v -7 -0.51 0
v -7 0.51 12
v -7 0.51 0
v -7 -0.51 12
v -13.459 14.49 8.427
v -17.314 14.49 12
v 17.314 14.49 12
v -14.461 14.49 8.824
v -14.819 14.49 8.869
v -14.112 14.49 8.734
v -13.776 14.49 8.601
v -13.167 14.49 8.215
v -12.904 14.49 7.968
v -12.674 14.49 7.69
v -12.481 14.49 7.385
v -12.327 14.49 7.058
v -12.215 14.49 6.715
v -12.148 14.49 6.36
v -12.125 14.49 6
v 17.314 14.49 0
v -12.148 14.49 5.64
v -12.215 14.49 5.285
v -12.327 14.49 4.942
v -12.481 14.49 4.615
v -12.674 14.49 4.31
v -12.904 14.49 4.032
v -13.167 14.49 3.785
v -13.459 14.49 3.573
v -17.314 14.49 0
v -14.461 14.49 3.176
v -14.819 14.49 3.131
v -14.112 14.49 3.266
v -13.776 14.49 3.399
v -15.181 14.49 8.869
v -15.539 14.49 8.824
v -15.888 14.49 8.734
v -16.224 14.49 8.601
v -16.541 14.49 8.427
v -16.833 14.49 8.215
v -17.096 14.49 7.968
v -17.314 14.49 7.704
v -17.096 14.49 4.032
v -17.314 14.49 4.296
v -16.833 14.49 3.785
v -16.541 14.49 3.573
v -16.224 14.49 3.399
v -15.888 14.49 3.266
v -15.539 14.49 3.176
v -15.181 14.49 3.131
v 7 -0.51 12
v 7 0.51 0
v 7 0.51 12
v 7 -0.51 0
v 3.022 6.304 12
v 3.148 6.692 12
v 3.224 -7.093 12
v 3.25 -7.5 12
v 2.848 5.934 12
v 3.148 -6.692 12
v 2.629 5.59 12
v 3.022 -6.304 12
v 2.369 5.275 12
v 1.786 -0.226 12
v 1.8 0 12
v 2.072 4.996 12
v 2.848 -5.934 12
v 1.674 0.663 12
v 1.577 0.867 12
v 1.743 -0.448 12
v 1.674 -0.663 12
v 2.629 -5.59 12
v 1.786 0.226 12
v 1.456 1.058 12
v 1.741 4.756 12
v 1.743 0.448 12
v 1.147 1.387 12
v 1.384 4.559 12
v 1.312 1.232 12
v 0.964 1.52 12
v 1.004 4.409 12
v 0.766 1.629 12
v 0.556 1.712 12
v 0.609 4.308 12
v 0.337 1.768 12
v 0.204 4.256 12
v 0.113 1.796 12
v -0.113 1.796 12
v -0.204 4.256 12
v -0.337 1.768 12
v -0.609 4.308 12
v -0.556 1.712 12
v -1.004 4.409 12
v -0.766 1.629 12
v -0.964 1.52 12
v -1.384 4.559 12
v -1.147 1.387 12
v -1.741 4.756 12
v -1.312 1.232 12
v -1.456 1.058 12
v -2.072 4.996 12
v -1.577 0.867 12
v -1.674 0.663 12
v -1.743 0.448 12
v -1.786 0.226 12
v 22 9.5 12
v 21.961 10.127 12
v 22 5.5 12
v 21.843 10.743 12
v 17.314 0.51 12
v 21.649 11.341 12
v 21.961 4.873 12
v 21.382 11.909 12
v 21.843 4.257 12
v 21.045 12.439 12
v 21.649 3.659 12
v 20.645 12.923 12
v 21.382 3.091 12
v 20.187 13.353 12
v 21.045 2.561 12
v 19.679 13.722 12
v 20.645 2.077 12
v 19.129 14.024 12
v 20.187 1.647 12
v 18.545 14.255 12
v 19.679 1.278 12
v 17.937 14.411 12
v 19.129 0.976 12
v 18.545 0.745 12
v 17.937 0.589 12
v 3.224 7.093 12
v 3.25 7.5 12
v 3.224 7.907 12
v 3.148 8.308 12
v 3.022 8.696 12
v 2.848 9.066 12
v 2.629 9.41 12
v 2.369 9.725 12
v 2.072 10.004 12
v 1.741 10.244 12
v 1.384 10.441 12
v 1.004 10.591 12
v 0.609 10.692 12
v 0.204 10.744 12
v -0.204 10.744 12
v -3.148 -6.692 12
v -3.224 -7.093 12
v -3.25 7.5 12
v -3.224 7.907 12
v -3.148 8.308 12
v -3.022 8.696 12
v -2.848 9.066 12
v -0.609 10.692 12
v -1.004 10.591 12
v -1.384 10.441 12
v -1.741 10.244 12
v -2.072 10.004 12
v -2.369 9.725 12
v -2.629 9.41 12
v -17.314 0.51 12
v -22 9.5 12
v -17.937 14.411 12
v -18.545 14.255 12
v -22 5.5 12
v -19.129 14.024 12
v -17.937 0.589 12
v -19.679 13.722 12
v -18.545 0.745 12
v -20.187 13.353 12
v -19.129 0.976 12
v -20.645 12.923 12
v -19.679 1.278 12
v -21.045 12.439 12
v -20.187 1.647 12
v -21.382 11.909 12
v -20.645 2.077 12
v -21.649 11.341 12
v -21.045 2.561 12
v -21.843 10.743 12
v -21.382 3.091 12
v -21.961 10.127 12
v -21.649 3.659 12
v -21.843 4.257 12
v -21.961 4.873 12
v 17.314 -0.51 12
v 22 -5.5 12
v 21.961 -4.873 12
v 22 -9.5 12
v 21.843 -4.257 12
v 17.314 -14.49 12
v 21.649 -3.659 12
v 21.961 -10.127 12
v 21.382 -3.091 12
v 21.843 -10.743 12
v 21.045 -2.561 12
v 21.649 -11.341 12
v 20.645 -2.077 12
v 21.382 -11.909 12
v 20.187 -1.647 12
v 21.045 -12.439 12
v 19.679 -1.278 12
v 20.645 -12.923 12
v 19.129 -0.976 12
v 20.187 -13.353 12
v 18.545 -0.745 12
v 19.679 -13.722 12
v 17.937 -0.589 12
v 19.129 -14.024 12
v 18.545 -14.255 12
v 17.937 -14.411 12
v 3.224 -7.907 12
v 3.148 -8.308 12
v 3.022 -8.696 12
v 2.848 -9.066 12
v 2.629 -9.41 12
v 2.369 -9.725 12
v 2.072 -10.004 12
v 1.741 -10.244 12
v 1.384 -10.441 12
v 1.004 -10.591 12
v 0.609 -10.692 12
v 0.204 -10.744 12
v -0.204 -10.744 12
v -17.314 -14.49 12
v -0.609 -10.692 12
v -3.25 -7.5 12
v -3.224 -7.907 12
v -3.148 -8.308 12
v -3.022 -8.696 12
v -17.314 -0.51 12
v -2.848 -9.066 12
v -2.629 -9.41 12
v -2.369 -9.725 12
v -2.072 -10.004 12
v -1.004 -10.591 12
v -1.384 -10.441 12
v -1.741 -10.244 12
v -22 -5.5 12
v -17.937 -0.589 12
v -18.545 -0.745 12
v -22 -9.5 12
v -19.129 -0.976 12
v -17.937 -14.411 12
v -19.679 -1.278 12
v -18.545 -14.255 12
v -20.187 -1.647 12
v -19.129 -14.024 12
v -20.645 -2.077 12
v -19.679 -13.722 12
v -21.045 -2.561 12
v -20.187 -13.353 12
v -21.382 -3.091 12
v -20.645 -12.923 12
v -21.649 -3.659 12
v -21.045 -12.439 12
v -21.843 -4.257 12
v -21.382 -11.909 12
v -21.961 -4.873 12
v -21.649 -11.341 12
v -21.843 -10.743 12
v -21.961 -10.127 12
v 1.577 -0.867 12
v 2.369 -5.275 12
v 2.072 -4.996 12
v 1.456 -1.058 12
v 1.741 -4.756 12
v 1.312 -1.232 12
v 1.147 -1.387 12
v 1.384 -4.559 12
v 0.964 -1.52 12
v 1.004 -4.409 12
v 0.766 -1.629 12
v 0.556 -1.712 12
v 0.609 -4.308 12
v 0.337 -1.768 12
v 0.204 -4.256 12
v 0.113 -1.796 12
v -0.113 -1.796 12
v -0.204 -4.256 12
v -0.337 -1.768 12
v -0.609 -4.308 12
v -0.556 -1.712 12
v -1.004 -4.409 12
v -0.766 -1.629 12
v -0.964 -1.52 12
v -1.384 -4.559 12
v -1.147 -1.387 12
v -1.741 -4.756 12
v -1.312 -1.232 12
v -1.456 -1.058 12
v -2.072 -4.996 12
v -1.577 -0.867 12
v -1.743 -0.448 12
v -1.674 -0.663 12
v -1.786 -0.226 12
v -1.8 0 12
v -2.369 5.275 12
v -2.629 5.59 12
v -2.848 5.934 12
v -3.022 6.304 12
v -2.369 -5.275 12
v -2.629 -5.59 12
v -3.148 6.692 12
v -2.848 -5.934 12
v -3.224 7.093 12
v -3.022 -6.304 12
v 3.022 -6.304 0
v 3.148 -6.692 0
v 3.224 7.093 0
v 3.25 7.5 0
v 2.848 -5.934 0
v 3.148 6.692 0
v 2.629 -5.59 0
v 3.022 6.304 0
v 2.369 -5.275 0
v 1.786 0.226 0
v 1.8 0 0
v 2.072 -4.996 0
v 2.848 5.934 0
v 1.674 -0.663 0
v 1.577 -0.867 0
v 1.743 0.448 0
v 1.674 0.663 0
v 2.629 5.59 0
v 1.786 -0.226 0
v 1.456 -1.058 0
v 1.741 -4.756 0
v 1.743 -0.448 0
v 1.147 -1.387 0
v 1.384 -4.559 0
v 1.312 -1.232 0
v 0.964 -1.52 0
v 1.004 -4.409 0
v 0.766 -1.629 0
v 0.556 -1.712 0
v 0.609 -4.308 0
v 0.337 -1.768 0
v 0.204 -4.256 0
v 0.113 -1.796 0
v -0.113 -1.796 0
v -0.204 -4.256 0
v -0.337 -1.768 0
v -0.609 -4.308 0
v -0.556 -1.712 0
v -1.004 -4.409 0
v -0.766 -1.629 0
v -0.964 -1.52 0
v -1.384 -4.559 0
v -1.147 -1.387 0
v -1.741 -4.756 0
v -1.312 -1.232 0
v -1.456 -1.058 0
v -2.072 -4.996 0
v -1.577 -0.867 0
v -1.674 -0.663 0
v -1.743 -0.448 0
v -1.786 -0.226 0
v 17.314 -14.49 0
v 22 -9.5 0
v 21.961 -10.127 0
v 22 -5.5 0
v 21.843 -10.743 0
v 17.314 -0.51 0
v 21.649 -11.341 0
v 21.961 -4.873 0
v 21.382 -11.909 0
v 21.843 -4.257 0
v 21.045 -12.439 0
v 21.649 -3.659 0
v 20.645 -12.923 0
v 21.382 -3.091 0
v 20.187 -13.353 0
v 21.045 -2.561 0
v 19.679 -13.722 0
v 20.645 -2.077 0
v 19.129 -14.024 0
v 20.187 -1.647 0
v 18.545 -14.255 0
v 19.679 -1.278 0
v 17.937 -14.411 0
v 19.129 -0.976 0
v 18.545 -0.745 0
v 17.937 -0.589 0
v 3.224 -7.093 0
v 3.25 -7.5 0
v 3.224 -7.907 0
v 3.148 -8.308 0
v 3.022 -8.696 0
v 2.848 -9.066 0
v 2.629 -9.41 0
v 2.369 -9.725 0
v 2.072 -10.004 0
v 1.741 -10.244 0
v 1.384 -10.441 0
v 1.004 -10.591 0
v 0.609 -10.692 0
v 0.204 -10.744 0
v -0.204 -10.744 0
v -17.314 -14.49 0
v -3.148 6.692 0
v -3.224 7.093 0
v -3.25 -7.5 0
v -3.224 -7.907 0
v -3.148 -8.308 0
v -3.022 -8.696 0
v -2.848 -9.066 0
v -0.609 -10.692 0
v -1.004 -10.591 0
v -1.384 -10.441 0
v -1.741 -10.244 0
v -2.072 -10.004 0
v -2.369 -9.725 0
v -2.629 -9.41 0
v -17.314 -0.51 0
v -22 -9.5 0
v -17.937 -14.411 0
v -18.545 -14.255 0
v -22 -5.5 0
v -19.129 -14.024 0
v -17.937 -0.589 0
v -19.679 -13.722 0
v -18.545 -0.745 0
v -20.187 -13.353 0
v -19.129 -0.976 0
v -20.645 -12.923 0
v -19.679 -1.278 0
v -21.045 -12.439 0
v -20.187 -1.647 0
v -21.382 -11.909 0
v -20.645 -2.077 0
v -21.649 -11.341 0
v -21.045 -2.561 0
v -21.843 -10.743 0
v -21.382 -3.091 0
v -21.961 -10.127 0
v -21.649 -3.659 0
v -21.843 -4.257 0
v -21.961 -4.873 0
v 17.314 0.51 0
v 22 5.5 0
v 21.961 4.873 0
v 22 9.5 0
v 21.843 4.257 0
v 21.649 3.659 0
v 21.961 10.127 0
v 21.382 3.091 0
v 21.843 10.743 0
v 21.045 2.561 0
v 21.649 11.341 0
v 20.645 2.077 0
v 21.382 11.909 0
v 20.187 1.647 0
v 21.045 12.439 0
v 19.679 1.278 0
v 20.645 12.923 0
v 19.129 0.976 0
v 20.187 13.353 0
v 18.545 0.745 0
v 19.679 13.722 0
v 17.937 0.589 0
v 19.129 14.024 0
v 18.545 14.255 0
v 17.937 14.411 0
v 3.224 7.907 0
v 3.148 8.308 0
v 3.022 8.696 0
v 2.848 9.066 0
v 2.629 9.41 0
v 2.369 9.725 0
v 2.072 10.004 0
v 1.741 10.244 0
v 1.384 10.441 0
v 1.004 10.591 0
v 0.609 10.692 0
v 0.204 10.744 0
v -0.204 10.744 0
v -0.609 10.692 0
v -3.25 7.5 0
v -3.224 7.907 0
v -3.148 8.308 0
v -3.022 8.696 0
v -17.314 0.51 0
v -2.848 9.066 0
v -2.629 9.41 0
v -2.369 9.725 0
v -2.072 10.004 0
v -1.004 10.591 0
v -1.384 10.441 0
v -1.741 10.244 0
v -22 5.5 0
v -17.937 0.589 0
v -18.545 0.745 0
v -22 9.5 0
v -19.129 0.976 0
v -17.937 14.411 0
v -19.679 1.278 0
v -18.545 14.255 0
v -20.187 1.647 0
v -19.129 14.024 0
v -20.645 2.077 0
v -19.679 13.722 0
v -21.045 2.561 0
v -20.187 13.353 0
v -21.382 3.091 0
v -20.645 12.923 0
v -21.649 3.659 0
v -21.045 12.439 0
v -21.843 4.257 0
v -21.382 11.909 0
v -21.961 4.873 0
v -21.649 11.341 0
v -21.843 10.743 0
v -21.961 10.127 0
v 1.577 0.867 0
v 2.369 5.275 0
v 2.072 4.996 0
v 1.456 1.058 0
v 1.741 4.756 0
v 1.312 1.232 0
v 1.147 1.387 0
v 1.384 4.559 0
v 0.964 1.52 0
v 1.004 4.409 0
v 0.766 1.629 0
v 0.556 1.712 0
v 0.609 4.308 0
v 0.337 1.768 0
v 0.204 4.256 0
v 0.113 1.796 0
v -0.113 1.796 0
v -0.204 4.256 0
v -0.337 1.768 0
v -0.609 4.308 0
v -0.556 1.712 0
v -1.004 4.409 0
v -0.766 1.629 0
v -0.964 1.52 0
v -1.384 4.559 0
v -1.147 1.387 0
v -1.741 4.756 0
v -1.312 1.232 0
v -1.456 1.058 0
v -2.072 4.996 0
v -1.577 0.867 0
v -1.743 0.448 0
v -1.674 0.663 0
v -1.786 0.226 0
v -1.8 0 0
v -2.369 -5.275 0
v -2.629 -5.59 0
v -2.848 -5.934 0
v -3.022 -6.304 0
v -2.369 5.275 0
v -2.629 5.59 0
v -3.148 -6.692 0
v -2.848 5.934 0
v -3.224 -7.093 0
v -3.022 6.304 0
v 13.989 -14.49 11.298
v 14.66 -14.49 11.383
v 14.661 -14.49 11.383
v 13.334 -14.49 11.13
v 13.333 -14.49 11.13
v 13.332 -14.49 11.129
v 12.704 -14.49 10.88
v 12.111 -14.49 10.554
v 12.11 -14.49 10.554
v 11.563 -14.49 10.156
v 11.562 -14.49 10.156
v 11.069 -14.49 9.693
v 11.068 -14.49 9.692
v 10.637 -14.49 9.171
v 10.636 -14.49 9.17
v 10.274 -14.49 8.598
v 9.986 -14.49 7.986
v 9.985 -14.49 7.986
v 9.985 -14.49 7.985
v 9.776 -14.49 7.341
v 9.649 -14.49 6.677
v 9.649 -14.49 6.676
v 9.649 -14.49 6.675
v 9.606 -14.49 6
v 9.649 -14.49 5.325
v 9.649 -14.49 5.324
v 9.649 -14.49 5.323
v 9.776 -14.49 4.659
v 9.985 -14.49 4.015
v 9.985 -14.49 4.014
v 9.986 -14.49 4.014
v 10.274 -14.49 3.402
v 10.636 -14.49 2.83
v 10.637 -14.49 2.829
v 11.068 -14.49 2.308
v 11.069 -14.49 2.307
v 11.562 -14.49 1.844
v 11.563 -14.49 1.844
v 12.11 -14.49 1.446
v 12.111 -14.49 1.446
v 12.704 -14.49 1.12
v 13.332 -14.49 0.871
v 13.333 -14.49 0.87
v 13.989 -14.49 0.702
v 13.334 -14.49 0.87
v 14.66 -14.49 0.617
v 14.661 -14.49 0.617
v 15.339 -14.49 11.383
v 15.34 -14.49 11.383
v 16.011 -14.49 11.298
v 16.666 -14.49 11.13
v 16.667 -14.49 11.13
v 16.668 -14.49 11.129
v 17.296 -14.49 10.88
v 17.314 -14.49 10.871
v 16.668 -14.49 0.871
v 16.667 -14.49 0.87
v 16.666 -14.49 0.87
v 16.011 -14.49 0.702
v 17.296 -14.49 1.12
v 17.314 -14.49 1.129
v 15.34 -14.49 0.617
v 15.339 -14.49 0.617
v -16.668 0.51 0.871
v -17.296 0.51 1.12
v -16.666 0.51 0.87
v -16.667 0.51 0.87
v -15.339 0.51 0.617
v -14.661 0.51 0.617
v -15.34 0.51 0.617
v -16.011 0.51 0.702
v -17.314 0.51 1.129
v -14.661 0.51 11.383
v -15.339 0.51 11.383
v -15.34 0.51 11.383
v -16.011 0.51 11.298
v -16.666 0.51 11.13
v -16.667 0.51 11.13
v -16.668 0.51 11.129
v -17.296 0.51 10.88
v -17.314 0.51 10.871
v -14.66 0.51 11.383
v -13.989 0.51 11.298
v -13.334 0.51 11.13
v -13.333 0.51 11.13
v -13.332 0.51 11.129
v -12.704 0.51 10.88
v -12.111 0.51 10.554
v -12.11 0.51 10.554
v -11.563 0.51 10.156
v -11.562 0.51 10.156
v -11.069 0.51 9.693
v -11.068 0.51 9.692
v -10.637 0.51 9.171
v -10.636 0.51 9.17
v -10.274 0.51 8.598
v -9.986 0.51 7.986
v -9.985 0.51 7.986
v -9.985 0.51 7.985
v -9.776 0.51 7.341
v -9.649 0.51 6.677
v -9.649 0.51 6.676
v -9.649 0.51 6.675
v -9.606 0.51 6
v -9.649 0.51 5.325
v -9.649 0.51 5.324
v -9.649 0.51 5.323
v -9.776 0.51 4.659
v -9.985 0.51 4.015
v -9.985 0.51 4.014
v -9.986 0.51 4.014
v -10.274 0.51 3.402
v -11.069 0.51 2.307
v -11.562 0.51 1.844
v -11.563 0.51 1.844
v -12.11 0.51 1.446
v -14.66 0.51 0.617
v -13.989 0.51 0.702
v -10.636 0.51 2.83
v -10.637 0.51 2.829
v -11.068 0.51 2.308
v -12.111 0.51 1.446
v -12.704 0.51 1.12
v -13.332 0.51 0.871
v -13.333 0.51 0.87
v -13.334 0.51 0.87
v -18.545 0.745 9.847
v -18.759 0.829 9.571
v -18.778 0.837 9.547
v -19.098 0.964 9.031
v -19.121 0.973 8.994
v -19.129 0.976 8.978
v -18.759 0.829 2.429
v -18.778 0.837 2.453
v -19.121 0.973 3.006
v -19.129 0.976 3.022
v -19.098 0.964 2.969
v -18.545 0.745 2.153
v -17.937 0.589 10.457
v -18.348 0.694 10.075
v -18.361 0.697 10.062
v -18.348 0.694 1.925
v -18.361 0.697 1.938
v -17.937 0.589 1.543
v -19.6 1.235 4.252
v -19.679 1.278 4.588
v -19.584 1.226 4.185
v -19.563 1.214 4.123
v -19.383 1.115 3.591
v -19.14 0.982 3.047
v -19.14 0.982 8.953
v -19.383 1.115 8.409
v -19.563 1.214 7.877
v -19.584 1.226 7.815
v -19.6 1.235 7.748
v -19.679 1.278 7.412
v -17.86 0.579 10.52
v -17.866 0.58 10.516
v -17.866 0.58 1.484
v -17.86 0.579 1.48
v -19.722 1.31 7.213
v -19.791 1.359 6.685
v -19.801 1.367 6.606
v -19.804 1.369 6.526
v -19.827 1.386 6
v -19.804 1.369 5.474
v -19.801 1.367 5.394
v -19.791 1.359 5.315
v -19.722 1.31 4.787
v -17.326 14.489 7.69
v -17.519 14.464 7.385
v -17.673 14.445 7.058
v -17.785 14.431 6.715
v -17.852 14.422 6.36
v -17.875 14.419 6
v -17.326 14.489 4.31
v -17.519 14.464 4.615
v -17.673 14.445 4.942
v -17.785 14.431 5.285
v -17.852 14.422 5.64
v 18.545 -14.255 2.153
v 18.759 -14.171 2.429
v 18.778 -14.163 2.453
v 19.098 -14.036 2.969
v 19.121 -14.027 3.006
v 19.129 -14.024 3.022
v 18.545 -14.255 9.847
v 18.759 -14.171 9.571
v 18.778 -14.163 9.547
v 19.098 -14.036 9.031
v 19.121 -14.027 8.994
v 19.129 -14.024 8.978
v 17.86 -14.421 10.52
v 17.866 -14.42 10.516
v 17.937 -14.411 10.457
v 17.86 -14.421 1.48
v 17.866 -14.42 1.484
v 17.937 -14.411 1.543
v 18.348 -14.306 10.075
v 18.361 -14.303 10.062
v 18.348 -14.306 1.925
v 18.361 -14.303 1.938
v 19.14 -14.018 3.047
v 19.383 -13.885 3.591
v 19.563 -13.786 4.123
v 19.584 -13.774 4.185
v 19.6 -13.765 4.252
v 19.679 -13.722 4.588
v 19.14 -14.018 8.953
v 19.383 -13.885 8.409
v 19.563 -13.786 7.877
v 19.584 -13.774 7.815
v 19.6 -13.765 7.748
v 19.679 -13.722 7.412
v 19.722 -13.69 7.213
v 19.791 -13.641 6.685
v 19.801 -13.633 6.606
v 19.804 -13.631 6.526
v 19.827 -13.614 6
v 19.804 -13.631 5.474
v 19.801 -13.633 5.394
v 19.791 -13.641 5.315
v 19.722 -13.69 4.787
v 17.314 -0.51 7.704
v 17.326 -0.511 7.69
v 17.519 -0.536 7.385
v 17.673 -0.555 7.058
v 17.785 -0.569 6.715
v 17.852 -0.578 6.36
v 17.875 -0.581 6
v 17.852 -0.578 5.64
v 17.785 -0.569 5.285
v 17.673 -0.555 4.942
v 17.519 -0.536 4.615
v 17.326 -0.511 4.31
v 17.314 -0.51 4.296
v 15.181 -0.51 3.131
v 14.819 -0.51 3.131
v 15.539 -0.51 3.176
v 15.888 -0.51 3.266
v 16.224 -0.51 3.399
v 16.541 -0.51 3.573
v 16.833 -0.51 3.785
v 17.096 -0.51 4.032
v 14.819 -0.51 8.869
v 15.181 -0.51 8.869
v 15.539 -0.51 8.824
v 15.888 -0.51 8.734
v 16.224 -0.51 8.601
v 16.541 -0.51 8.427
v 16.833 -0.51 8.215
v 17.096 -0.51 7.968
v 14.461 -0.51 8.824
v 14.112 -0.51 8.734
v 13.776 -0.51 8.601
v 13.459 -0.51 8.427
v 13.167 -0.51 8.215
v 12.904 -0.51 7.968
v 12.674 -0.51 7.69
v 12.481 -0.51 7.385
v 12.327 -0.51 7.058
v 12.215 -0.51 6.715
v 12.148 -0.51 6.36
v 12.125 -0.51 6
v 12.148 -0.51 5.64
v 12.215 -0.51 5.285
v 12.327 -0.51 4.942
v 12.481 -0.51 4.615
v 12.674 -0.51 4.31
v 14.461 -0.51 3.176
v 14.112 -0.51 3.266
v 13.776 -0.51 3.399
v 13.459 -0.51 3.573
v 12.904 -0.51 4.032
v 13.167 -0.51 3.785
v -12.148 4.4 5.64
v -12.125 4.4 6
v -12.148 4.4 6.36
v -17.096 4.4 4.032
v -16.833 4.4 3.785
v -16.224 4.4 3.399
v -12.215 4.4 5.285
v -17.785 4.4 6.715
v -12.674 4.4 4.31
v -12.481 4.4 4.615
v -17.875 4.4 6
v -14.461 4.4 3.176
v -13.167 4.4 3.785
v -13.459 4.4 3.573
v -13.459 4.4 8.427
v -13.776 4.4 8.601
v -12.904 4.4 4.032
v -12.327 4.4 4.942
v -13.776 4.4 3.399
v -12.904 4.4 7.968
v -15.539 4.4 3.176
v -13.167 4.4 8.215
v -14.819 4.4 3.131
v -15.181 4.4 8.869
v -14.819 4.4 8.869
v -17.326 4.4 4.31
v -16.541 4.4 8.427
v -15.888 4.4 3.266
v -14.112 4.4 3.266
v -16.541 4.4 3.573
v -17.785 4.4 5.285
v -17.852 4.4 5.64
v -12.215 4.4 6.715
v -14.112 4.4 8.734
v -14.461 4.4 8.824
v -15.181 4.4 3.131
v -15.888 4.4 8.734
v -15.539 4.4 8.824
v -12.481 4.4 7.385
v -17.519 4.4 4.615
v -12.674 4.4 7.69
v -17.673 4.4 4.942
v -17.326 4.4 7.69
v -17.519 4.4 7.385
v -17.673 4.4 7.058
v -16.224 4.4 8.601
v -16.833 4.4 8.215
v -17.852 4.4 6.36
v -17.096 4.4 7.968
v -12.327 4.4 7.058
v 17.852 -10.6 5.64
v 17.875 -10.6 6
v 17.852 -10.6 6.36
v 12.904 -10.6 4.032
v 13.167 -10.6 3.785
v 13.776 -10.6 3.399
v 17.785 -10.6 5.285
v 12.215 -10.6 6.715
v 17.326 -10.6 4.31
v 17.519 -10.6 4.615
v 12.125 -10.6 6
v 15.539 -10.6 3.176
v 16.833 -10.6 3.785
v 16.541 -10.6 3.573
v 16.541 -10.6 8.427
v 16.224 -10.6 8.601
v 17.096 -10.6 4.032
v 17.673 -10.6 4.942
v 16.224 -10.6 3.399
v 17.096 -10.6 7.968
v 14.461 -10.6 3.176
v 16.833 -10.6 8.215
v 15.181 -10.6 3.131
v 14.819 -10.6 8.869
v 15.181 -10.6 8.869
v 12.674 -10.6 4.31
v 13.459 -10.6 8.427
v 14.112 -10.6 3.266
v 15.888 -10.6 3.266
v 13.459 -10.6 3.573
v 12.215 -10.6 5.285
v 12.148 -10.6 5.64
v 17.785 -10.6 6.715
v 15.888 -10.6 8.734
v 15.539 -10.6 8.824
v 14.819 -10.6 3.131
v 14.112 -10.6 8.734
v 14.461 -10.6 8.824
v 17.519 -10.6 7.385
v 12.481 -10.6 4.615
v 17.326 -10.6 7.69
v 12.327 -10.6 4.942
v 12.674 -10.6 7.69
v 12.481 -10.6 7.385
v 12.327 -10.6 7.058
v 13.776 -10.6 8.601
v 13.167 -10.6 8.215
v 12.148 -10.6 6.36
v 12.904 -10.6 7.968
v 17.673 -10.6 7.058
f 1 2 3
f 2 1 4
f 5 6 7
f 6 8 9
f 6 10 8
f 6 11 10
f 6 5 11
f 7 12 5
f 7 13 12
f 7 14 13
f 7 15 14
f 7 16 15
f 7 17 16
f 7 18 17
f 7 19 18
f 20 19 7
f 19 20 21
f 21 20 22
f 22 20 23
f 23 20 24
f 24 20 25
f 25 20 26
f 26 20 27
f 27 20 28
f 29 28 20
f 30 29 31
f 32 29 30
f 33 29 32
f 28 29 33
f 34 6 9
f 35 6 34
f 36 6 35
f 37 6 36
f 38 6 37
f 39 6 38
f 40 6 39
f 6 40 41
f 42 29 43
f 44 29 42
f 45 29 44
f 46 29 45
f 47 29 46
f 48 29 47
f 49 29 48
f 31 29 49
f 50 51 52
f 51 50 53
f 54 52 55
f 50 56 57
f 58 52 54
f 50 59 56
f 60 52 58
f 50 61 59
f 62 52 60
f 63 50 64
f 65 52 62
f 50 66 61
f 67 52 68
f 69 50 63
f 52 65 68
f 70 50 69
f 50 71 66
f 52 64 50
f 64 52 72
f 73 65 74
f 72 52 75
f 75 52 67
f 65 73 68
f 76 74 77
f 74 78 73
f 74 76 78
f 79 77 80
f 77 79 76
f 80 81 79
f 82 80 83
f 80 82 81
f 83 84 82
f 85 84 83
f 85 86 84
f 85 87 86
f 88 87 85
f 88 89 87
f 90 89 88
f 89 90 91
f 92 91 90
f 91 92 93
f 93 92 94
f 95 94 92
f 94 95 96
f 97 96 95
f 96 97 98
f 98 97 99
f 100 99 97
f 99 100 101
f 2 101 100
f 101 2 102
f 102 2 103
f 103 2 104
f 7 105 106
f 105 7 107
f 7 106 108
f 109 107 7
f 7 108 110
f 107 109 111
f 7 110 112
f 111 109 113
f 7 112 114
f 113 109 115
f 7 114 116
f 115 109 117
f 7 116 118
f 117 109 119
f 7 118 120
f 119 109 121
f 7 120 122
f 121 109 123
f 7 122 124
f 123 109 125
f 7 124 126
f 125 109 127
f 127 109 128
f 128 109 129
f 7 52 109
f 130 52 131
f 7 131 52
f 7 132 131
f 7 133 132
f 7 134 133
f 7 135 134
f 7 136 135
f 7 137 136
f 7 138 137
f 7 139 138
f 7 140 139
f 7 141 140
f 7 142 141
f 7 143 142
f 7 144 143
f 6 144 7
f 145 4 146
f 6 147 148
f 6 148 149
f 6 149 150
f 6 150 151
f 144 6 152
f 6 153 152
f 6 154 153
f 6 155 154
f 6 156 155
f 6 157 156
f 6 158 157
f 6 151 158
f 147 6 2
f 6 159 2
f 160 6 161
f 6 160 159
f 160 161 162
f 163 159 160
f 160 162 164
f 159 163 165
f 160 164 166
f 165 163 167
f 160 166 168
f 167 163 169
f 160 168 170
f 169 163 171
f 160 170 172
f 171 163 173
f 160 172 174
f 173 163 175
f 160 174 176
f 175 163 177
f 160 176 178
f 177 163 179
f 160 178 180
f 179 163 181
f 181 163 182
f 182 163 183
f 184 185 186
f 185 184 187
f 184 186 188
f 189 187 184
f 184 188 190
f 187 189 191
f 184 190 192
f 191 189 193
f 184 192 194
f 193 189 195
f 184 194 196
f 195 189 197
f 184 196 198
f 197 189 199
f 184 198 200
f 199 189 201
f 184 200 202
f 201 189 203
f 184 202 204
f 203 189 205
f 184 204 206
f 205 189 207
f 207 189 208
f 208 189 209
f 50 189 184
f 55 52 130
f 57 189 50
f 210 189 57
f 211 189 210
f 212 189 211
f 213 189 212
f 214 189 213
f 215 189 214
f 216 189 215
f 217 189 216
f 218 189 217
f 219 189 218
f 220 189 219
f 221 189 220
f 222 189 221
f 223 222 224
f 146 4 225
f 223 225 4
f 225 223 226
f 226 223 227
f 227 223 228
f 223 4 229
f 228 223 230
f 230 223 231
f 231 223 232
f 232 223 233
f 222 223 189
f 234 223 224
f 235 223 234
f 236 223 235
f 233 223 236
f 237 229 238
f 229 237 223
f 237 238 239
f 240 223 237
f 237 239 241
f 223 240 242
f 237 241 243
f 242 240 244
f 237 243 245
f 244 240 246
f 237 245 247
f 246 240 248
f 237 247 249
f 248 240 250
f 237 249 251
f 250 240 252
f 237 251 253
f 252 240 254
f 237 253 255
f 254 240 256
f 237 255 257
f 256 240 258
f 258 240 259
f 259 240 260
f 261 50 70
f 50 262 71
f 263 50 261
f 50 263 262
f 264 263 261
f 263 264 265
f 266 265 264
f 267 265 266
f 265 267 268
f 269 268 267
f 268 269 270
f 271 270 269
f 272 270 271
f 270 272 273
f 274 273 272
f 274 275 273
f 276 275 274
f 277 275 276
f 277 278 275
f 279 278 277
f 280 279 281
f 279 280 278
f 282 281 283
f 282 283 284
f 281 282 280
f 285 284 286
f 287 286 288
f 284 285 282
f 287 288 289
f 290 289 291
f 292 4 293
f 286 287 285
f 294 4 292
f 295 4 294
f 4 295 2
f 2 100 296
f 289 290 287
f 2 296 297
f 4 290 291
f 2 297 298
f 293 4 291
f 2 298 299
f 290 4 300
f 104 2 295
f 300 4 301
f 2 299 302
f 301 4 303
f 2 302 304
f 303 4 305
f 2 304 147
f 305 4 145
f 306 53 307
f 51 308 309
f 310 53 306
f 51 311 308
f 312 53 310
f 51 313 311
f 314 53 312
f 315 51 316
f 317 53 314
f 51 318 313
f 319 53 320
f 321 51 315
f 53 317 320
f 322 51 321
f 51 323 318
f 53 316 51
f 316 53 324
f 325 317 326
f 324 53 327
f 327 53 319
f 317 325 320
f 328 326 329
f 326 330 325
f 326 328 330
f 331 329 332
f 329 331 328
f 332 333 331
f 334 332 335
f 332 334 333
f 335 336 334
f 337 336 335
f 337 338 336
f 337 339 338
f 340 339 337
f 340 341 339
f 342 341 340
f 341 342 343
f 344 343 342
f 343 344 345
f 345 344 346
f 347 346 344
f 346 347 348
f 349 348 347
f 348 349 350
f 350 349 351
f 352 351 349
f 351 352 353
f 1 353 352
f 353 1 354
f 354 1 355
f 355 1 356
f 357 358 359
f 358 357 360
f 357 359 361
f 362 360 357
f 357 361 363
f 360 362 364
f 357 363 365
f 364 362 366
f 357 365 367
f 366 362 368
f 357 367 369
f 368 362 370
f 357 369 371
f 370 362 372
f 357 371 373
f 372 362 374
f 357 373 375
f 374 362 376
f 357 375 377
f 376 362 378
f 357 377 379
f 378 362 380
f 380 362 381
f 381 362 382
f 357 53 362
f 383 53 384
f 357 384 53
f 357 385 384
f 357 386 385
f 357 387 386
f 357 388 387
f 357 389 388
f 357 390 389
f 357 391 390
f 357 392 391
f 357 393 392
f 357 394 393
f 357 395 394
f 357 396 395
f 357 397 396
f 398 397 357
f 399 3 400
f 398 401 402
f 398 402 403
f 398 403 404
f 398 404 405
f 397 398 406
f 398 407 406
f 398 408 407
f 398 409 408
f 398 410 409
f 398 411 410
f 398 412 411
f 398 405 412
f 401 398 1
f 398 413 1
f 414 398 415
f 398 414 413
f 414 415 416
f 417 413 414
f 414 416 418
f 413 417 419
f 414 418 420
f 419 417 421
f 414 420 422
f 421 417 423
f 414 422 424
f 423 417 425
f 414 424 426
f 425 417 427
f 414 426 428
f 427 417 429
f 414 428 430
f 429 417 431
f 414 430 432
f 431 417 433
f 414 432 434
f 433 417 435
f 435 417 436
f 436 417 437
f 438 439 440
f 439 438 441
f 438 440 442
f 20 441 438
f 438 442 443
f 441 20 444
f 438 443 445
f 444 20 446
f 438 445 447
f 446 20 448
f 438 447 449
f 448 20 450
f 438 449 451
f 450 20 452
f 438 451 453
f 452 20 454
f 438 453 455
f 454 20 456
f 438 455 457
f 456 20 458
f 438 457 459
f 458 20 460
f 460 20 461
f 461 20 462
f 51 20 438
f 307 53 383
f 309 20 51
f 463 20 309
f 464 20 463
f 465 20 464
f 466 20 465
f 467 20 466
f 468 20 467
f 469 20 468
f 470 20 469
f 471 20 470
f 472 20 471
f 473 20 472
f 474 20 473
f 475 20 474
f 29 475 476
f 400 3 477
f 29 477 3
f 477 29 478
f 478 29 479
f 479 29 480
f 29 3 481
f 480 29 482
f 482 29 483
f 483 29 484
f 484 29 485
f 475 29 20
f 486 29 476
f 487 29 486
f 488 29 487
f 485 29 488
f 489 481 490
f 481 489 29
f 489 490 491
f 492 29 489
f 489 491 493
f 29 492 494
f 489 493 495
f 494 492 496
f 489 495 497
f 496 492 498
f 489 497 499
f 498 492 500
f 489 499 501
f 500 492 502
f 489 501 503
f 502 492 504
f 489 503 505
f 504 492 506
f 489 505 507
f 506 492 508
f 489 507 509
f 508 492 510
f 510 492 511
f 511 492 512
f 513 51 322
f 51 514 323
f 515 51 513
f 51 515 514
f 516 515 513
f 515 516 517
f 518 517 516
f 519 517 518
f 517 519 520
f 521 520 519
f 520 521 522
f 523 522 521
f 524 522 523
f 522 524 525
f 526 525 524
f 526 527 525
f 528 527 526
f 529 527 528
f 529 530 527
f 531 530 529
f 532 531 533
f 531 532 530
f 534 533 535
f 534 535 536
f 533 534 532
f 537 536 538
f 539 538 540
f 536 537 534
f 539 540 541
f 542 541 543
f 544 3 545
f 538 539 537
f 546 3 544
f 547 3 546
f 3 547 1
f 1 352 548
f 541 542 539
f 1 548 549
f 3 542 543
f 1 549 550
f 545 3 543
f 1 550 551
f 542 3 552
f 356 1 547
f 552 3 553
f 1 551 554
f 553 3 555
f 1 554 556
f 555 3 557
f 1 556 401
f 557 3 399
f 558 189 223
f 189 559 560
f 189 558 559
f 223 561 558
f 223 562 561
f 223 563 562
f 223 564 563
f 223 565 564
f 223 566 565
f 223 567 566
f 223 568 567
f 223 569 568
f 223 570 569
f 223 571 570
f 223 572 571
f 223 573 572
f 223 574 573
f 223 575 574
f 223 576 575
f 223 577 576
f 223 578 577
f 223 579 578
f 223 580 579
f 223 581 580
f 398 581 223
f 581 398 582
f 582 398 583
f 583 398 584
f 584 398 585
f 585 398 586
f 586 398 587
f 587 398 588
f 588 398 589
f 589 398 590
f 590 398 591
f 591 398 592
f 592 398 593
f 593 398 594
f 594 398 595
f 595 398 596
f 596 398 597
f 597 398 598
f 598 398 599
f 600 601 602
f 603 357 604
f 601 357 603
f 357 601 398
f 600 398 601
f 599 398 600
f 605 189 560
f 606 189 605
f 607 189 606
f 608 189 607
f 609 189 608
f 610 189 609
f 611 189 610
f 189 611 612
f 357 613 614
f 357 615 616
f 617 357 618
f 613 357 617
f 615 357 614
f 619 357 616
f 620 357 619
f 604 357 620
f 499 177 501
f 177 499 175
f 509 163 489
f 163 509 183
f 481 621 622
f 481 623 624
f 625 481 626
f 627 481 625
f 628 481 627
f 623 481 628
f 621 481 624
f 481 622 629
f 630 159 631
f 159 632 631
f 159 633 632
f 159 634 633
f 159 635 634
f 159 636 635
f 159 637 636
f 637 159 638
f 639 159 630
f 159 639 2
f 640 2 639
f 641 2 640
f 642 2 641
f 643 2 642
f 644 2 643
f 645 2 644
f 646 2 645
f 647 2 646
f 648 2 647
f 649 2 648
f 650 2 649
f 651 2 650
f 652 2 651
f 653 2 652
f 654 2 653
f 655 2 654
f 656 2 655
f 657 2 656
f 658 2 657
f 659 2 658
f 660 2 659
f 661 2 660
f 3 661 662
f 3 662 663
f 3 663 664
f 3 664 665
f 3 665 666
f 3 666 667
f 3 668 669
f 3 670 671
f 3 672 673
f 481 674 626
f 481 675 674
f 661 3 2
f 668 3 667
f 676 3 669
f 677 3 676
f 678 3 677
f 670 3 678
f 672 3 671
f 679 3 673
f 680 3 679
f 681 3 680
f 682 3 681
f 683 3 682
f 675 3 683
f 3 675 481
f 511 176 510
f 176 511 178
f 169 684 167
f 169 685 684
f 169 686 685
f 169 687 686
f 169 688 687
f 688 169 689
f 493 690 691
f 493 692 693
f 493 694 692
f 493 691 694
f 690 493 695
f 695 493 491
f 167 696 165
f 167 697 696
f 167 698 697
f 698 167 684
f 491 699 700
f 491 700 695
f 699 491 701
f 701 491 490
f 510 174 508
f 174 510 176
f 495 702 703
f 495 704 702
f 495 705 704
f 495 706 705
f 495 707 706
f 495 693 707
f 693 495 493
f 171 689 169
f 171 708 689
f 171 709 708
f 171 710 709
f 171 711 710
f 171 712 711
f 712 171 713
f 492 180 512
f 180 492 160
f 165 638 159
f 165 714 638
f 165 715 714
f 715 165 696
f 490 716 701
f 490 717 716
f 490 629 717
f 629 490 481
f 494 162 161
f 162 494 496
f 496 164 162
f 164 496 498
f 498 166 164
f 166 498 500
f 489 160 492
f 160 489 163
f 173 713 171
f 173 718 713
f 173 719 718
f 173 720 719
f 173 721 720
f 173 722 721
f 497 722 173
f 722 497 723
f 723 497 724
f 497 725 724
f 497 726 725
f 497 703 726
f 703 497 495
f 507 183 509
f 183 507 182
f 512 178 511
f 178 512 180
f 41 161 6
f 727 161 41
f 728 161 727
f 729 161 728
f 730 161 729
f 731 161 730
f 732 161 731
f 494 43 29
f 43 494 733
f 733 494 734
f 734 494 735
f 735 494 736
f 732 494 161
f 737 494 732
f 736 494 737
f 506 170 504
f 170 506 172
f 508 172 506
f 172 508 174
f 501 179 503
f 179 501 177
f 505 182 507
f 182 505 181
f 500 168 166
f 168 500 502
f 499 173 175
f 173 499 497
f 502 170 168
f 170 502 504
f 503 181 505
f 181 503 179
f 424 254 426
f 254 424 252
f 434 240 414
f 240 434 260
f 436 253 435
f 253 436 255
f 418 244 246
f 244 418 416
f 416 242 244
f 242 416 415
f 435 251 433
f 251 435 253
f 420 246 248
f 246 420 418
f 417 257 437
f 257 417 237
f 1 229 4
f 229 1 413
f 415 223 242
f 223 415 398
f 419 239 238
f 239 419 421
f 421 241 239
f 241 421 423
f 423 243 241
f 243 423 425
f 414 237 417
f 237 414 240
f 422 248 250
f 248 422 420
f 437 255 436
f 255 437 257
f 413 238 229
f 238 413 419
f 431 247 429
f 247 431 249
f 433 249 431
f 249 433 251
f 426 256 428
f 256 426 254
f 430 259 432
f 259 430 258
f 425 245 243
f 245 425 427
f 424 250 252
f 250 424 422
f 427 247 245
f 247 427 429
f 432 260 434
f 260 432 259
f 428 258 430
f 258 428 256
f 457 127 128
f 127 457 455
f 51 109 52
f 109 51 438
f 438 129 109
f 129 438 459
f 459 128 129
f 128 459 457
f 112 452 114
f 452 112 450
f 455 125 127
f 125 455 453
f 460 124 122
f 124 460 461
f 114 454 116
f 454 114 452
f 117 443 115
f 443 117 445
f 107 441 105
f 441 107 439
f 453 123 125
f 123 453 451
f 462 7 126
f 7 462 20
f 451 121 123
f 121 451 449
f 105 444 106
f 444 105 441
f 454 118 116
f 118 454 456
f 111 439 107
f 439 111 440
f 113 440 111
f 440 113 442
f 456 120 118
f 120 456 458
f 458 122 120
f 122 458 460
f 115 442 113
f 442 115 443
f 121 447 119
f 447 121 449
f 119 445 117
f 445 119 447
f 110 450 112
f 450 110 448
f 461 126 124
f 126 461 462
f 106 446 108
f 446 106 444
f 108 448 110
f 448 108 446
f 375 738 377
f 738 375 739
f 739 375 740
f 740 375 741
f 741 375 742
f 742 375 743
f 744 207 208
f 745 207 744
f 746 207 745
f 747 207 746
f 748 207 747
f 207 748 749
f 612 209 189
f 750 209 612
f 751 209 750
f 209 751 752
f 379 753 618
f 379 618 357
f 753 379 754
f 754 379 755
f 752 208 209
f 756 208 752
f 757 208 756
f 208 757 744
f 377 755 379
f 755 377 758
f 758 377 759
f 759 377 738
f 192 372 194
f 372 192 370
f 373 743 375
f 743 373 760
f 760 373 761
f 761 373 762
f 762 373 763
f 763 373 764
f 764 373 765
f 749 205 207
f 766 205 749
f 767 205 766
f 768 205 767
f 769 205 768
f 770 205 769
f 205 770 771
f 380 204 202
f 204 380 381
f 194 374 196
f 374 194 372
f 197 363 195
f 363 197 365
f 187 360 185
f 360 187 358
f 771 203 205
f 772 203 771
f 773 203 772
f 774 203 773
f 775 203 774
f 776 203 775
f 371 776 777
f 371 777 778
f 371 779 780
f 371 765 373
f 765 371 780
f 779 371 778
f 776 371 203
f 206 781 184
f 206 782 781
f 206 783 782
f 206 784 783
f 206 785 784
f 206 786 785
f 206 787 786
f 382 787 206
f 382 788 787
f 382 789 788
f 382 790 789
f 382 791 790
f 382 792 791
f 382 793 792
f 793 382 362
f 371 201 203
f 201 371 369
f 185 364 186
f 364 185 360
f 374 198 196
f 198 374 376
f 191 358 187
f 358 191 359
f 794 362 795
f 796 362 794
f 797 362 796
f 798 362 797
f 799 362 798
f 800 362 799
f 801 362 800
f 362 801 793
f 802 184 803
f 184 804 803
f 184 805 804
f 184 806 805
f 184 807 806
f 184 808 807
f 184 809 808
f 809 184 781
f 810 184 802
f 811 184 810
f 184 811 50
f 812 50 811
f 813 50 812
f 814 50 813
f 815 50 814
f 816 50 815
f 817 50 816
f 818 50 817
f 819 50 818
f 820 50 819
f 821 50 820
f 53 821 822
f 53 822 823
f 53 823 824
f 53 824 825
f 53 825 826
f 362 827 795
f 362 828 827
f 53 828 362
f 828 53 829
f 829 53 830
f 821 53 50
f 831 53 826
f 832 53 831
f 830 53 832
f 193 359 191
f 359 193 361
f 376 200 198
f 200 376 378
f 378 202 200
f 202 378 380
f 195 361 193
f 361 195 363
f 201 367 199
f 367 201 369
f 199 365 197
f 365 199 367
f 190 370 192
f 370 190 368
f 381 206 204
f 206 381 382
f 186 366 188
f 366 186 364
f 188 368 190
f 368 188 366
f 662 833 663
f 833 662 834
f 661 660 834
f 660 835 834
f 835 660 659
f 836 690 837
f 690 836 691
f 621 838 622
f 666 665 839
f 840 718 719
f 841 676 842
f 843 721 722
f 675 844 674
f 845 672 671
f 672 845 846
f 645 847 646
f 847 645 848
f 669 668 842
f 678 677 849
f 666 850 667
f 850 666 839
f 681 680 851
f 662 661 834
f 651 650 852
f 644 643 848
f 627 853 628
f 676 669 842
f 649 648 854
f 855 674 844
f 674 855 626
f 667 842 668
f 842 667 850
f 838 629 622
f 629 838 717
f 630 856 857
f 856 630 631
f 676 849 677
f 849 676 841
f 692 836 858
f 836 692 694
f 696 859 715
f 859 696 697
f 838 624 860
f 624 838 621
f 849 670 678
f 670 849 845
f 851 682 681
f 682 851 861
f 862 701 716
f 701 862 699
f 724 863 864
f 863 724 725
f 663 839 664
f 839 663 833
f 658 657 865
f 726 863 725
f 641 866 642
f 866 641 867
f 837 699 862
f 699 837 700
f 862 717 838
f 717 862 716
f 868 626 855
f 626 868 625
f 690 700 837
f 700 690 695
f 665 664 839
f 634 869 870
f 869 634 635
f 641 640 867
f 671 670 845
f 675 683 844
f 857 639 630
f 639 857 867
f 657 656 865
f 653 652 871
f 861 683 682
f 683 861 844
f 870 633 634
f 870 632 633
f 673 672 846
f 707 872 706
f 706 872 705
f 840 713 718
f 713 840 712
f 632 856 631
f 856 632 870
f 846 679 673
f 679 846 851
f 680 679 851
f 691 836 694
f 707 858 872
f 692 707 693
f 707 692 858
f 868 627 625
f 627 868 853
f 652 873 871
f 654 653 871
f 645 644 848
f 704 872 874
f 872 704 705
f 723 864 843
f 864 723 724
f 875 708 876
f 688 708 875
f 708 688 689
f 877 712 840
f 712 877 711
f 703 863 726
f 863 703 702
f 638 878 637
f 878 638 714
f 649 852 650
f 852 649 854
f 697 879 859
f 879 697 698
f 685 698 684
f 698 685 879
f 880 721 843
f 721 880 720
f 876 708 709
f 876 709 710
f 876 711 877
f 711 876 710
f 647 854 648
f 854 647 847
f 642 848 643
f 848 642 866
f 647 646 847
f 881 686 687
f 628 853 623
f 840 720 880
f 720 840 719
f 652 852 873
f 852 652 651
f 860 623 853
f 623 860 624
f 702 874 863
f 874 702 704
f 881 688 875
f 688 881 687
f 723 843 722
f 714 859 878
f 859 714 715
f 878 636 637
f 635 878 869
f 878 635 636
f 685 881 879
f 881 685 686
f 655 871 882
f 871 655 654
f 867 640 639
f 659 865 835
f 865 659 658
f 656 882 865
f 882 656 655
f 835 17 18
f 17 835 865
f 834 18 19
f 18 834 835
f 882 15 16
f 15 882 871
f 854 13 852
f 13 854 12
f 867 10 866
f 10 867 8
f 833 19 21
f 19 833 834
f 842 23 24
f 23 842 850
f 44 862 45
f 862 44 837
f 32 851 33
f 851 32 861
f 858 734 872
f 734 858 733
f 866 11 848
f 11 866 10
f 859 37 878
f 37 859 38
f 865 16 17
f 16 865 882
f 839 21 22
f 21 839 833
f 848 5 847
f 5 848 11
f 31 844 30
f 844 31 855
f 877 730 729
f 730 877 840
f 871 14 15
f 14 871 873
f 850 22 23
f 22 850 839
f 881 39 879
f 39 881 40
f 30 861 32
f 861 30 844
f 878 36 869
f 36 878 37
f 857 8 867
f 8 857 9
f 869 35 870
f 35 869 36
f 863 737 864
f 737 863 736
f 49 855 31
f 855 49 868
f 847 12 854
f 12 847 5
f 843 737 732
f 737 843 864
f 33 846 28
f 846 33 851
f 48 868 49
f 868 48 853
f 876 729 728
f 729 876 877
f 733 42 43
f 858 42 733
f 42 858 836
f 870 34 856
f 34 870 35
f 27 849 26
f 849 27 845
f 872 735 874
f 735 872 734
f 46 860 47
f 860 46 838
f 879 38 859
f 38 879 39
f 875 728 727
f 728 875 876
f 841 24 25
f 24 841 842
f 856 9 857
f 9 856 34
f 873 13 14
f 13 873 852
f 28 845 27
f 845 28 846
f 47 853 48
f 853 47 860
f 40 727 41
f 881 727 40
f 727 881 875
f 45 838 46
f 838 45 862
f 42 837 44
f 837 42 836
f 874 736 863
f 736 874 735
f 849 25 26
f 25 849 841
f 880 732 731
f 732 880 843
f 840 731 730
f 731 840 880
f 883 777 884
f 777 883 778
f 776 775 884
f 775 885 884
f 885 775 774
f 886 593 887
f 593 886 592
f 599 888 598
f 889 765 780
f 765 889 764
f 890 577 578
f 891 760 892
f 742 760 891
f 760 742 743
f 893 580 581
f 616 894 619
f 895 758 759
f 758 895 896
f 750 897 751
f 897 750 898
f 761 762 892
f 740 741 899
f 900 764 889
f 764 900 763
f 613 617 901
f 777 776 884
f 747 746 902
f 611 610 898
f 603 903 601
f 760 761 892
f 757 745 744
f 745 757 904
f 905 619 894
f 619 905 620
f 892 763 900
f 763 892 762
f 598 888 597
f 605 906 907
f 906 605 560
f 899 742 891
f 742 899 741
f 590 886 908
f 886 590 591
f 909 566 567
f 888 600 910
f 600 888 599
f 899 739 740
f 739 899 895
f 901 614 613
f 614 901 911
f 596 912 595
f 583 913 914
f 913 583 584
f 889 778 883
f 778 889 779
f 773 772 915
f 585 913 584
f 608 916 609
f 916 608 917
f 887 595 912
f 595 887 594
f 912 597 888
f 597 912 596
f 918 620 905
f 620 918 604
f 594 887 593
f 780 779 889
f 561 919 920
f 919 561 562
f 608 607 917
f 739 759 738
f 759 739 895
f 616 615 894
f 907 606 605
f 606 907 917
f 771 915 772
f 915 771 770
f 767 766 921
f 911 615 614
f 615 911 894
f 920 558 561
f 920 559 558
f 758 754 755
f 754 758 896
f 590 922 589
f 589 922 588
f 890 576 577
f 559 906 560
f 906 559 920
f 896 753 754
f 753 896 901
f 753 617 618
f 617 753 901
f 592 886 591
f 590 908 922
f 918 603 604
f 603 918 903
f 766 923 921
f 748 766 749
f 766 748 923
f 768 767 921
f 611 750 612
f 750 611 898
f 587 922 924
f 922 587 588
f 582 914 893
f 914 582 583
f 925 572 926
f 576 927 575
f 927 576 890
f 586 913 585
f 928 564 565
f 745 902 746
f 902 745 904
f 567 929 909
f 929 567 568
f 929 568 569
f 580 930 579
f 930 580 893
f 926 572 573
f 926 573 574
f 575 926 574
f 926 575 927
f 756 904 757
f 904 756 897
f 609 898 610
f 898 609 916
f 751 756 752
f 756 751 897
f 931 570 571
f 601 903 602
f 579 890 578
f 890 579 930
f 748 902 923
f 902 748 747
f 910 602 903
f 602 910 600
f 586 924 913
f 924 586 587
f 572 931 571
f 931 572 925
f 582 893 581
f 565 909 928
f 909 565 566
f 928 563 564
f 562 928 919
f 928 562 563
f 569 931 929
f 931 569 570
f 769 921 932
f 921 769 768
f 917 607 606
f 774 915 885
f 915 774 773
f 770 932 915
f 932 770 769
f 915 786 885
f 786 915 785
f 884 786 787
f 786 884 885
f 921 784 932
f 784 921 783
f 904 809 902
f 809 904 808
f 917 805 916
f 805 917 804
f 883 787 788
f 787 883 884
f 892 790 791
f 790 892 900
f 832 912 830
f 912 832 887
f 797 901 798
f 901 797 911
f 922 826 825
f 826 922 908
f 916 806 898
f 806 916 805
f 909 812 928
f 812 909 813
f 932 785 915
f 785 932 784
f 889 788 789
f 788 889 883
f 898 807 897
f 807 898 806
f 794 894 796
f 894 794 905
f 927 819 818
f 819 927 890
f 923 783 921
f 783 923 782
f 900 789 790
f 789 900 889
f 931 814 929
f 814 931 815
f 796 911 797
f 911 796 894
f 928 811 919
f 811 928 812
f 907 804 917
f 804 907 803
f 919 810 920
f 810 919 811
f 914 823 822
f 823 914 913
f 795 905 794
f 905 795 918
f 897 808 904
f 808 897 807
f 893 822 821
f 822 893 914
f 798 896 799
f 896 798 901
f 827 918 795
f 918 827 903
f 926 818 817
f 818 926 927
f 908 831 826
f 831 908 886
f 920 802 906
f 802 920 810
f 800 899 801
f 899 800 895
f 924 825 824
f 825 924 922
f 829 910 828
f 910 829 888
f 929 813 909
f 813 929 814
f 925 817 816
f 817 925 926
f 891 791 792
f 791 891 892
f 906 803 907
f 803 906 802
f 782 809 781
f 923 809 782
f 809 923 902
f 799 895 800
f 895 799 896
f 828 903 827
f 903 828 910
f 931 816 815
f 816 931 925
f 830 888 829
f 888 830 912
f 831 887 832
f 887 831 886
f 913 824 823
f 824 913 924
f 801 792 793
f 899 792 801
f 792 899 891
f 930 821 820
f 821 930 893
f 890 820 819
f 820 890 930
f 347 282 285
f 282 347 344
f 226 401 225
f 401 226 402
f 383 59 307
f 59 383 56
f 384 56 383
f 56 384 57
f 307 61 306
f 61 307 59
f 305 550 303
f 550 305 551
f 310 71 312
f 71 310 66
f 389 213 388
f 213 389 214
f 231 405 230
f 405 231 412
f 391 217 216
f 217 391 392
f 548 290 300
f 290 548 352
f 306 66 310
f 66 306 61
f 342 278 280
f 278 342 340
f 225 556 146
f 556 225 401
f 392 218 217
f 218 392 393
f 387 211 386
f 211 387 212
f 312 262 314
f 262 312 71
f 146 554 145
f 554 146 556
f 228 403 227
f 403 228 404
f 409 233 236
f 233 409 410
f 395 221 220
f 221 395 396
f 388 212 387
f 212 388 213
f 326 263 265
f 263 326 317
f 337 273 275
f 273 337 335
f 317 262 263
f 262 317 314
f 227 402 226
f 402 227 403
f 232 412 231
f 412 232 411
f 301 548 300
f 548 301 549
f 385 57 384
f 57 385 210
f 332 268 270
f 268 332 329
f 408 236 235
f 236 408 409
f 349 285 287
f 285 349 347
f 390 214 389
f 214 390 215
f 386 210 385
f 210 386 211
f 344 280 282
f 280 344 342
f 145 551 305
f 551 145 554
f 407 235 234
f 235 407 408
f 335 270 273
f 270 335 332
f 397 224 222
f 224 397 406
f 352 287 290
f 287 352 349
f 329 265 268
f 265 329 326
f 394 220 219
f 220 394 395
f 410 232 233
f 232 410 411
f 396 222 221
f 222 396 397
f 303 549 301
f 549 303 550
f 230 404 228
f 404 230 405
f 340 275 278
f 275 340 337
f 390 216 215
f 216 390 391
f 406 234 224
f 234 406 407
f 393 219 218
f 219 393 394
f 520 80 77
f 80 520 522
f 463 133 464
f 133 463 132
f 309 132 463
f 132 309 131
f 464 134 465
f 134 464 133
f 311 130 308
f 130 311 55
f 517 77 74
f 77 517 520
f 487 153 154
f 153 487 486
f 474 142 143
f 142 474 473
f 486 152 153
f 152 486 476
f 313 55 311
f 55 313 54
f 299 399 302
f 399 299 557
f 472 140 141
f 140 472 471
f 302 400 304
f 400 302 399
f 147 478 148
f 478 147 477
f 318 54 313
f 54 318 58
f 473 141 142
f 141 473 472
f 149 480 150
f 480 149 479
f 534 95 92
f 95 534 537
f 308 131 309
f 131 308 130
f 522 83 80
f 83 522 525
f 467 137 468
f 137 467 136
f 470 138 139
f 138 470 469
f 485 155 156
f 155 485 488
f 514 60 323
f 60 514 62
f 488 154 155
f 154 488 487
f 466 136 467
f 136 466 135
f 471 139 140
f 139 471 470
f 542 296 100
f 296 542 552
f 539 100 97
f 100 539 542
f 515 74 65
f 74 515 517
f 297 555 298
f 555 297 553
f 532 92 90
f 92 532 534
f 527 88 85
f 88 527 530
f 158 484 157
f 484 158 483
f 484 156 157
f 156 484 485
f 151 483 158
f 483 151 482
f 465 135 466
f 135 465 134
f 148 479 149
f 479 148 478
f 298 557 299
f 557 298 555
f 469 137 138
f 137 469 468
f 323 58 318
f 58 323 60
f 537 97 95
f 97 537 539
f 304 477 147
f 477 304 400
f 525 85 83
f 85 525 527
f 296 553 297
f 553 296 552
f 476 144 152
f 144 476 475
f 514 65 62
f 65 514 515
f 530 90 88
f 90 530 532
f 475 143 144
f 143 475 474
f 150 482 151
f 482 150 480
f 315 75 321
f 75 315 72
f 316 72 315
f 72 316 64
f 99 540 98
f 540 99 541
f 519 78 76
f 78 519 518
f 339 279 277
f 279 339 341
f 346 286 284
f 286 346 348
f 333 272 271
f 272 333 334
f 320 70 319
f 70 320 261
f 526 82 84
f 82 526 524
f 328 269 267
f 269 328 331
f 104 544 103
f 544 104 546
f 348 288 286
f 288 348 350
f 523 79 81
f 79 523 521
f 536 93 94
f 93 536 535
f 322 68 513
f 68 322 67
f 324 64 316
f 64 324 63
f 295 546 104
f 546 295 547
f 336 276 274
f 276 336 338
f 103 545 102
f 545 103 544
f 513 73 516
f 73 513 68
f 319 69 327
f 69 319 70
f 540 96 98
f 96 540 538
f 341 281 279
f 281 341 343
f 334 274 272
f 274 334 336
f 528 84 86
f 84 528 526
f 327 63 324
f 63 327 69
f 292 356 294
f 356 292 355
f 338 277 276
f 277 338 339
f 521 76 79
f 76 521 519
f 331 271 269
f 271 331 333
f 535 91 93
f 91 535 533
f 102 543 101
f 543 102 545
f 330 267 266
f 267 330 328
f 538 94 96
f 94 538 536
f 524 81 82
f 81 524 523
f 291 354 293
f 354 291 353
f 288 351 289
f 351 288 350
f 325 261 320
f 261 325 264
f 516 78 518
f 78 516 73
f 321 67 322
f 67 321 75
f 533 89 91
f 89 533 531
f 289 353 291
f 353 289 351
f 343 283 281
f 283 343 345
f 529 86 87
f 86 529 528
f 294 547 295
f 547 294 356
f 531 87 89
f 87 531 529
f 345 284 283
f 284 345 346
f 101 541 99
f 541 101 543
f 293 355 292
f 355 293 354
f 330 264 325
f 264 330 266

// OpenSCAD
$fn = 50;


difference() {
	union() {
		hull() {
			translate(v = [-2.0000000000, 9.5000000000, 0]) {
				cylinder(h = 12, r = 5);
			}
			translate(v = [2.0000000000, 9.5000000000, 0]) {
				cylinder(h = 12, r = 5);
			}
			translate(v = [-2.0000000000, -9.5000000000, 0]) {
				cylinder(h = 12, r = 5);
			}
			translate(v = [2.0000000000, -9.5000000000, 0]) {
				cylinder(h = 12, r = 5);
			}
		}
		translate(v = [-7.5000000000, 7.5000000000, 0]) {
			hull() {
				translate(v = [-9.5000000000, 2.0000000000, 0]) {
					cylinder(h = 12, r = 5);
				}
				translate(v = [9.5000000000, 2.0000000000, 0]) {
					cylinder(h = 12, r = 5);
				}
				translate(v = [-9.5000000000, -2.0000000000, 0]) {
					cylinder(h = 12, r = 5);
				}
				translate(v = [9.5000000000, -2.0000000000, 0]) {
					cylinder(h = 12, r = 5);
				}
			}
		}
		translate(v = [-7.5000000000, -7.5000000000, 0]) {
			hull() {
				translate(v = [-9.5000000000, 2.0000000000, 0]) {
					cylinder(h = 12, r = 5);
				}
				translate(v = [9.5000000000, 2.0000000000, 0]) {
					cylinder(h = 12, r = 5);
				}
				translate(v = [-9.5000000000, -2.0000000000, 0]) {
					cylinder(h = 12, r = 5);
				}
				translate(v = [9.5000000000, -2.0000000000, 0]) {
					cylinder(h = 12, r = 5);
				}
			}
		}
		translate(v = [7.5000000000, 7.5000000000, 0]) {
			hull() {
				translate(v = [-9.5000000000, 2.0000000000, 0]) {
					cylinder(h = 12, r = 5);
				}
				translate(v = [9.5000000000, 2.0000000000, 0]) {
					cylinder(h = 12, r = 5);
				}
				translate(v = [-9.5000000000, -2.0000000000, 0]) {
					cylinder(h = 12, r = 5);
				}
				translate(v = [9.5000000000, -2.0000000000, 0]) {
					cylinder(h = 12, r = 5);
				}
			}
		}
		translate(v = [7.5000000000, -7.5000000000, 0]) {
			hull() {
				translate(v = [-9.5000000000, 2.0000000000, 0]) {
					cylinder(h = 12, r = 5);
				}
				translate(v = [9.5000000000, 2.0000000000, 0]) {
					cylinder(h = 12, r = 5);
				}
				translate(v = [-9.5000000000, -2.0000000000, 0]) {
					cylinder(h = 12, r = 5);
				}
				translate(v = [9.5000000000, -2.0000000000, 0]) {
					cylinder(h = 12, r = 5);
				}
			}
		}
	}
	union() {
		translate(v = [-15.0000000000, 0.5000000000, 6.0000000000]) {
			rotate(a = [90, 0, 0]) {
				difference() {
					union() {
						#translate(v = [0, 0, -14.0000000000]) {
							cylinder(h = 14, r = 2.6000000000);
						}
						#translate(v = [0, 0, -3.9000000000]) {
							cylinder(h = 3.9000000000, r1 = 2.8750000000, r2 = 5.4000000000);
						}
						#translate(v = [0, 0, -14.0000000000]) {
							cylinder(h = 14, r = 2.8750000000);
						}
						#translate(v = [0, 0, -14.0000000000]) {
							cylinder(h = 14, r = 2.6000000000);
						}
					}
					union();
				}
			}
		}
		translate(v = [15.0000000000, -14.5000000000, 6.0000000000]) {
			rotate(a = [90, 0, 0]) {
				difference() {
					union() {
						#translate(v = [0, 0, -14.0000000000]) {
							cylinder(h = 14, r = 2.6000000000);
						}
						#translate(v = [0, 0, -3.9000000000]) {
							cylinder(h = 3.9000000000, r1 = 2.8750000000, r2 = 5.4000000000);
						}
						#translate(v = [0, 0, -14.0000000000]) {
							cylinder(h = 14, r = 2.8750000000);
						}
						#translate(v = [0, 0, -14.0000000000]) {
							cylinder(h = 14, r = 2.6000000000);
						}
					}
					union();
				}
			}
		}
		translate(v = [0.0000000000, -7.5000000000, 0]) {
			translate(v = [0, 0, -100]) {
				cylinder(h = 200, r = 3.2500000000);
			}
		}
		translate(v = [0.0000000000, 7.5000000000, 0]) {
			translate(v = [0, 0, -100]) {
				cylinder(h = 200, r = 3.2500000000);
			}
		}
		translate(v = [0.0000000000, -7.5000000000, 0]) {
			translate(v = [0, 0, -100]) {
				cylinder(h = 200, r = 1.8000000000);
			}
		}
		translate(v = [0, 0, -100]) {
			cylinder(h = 200, r = 1.8000000000);
		}
		translate(v = [0.0000000000, 7.5000000000, 0]) {
			translate(v = [0, 0, -100]) {
				cylinder(h = 200, r = 1.8000000000);
			}
		}
	}
}
